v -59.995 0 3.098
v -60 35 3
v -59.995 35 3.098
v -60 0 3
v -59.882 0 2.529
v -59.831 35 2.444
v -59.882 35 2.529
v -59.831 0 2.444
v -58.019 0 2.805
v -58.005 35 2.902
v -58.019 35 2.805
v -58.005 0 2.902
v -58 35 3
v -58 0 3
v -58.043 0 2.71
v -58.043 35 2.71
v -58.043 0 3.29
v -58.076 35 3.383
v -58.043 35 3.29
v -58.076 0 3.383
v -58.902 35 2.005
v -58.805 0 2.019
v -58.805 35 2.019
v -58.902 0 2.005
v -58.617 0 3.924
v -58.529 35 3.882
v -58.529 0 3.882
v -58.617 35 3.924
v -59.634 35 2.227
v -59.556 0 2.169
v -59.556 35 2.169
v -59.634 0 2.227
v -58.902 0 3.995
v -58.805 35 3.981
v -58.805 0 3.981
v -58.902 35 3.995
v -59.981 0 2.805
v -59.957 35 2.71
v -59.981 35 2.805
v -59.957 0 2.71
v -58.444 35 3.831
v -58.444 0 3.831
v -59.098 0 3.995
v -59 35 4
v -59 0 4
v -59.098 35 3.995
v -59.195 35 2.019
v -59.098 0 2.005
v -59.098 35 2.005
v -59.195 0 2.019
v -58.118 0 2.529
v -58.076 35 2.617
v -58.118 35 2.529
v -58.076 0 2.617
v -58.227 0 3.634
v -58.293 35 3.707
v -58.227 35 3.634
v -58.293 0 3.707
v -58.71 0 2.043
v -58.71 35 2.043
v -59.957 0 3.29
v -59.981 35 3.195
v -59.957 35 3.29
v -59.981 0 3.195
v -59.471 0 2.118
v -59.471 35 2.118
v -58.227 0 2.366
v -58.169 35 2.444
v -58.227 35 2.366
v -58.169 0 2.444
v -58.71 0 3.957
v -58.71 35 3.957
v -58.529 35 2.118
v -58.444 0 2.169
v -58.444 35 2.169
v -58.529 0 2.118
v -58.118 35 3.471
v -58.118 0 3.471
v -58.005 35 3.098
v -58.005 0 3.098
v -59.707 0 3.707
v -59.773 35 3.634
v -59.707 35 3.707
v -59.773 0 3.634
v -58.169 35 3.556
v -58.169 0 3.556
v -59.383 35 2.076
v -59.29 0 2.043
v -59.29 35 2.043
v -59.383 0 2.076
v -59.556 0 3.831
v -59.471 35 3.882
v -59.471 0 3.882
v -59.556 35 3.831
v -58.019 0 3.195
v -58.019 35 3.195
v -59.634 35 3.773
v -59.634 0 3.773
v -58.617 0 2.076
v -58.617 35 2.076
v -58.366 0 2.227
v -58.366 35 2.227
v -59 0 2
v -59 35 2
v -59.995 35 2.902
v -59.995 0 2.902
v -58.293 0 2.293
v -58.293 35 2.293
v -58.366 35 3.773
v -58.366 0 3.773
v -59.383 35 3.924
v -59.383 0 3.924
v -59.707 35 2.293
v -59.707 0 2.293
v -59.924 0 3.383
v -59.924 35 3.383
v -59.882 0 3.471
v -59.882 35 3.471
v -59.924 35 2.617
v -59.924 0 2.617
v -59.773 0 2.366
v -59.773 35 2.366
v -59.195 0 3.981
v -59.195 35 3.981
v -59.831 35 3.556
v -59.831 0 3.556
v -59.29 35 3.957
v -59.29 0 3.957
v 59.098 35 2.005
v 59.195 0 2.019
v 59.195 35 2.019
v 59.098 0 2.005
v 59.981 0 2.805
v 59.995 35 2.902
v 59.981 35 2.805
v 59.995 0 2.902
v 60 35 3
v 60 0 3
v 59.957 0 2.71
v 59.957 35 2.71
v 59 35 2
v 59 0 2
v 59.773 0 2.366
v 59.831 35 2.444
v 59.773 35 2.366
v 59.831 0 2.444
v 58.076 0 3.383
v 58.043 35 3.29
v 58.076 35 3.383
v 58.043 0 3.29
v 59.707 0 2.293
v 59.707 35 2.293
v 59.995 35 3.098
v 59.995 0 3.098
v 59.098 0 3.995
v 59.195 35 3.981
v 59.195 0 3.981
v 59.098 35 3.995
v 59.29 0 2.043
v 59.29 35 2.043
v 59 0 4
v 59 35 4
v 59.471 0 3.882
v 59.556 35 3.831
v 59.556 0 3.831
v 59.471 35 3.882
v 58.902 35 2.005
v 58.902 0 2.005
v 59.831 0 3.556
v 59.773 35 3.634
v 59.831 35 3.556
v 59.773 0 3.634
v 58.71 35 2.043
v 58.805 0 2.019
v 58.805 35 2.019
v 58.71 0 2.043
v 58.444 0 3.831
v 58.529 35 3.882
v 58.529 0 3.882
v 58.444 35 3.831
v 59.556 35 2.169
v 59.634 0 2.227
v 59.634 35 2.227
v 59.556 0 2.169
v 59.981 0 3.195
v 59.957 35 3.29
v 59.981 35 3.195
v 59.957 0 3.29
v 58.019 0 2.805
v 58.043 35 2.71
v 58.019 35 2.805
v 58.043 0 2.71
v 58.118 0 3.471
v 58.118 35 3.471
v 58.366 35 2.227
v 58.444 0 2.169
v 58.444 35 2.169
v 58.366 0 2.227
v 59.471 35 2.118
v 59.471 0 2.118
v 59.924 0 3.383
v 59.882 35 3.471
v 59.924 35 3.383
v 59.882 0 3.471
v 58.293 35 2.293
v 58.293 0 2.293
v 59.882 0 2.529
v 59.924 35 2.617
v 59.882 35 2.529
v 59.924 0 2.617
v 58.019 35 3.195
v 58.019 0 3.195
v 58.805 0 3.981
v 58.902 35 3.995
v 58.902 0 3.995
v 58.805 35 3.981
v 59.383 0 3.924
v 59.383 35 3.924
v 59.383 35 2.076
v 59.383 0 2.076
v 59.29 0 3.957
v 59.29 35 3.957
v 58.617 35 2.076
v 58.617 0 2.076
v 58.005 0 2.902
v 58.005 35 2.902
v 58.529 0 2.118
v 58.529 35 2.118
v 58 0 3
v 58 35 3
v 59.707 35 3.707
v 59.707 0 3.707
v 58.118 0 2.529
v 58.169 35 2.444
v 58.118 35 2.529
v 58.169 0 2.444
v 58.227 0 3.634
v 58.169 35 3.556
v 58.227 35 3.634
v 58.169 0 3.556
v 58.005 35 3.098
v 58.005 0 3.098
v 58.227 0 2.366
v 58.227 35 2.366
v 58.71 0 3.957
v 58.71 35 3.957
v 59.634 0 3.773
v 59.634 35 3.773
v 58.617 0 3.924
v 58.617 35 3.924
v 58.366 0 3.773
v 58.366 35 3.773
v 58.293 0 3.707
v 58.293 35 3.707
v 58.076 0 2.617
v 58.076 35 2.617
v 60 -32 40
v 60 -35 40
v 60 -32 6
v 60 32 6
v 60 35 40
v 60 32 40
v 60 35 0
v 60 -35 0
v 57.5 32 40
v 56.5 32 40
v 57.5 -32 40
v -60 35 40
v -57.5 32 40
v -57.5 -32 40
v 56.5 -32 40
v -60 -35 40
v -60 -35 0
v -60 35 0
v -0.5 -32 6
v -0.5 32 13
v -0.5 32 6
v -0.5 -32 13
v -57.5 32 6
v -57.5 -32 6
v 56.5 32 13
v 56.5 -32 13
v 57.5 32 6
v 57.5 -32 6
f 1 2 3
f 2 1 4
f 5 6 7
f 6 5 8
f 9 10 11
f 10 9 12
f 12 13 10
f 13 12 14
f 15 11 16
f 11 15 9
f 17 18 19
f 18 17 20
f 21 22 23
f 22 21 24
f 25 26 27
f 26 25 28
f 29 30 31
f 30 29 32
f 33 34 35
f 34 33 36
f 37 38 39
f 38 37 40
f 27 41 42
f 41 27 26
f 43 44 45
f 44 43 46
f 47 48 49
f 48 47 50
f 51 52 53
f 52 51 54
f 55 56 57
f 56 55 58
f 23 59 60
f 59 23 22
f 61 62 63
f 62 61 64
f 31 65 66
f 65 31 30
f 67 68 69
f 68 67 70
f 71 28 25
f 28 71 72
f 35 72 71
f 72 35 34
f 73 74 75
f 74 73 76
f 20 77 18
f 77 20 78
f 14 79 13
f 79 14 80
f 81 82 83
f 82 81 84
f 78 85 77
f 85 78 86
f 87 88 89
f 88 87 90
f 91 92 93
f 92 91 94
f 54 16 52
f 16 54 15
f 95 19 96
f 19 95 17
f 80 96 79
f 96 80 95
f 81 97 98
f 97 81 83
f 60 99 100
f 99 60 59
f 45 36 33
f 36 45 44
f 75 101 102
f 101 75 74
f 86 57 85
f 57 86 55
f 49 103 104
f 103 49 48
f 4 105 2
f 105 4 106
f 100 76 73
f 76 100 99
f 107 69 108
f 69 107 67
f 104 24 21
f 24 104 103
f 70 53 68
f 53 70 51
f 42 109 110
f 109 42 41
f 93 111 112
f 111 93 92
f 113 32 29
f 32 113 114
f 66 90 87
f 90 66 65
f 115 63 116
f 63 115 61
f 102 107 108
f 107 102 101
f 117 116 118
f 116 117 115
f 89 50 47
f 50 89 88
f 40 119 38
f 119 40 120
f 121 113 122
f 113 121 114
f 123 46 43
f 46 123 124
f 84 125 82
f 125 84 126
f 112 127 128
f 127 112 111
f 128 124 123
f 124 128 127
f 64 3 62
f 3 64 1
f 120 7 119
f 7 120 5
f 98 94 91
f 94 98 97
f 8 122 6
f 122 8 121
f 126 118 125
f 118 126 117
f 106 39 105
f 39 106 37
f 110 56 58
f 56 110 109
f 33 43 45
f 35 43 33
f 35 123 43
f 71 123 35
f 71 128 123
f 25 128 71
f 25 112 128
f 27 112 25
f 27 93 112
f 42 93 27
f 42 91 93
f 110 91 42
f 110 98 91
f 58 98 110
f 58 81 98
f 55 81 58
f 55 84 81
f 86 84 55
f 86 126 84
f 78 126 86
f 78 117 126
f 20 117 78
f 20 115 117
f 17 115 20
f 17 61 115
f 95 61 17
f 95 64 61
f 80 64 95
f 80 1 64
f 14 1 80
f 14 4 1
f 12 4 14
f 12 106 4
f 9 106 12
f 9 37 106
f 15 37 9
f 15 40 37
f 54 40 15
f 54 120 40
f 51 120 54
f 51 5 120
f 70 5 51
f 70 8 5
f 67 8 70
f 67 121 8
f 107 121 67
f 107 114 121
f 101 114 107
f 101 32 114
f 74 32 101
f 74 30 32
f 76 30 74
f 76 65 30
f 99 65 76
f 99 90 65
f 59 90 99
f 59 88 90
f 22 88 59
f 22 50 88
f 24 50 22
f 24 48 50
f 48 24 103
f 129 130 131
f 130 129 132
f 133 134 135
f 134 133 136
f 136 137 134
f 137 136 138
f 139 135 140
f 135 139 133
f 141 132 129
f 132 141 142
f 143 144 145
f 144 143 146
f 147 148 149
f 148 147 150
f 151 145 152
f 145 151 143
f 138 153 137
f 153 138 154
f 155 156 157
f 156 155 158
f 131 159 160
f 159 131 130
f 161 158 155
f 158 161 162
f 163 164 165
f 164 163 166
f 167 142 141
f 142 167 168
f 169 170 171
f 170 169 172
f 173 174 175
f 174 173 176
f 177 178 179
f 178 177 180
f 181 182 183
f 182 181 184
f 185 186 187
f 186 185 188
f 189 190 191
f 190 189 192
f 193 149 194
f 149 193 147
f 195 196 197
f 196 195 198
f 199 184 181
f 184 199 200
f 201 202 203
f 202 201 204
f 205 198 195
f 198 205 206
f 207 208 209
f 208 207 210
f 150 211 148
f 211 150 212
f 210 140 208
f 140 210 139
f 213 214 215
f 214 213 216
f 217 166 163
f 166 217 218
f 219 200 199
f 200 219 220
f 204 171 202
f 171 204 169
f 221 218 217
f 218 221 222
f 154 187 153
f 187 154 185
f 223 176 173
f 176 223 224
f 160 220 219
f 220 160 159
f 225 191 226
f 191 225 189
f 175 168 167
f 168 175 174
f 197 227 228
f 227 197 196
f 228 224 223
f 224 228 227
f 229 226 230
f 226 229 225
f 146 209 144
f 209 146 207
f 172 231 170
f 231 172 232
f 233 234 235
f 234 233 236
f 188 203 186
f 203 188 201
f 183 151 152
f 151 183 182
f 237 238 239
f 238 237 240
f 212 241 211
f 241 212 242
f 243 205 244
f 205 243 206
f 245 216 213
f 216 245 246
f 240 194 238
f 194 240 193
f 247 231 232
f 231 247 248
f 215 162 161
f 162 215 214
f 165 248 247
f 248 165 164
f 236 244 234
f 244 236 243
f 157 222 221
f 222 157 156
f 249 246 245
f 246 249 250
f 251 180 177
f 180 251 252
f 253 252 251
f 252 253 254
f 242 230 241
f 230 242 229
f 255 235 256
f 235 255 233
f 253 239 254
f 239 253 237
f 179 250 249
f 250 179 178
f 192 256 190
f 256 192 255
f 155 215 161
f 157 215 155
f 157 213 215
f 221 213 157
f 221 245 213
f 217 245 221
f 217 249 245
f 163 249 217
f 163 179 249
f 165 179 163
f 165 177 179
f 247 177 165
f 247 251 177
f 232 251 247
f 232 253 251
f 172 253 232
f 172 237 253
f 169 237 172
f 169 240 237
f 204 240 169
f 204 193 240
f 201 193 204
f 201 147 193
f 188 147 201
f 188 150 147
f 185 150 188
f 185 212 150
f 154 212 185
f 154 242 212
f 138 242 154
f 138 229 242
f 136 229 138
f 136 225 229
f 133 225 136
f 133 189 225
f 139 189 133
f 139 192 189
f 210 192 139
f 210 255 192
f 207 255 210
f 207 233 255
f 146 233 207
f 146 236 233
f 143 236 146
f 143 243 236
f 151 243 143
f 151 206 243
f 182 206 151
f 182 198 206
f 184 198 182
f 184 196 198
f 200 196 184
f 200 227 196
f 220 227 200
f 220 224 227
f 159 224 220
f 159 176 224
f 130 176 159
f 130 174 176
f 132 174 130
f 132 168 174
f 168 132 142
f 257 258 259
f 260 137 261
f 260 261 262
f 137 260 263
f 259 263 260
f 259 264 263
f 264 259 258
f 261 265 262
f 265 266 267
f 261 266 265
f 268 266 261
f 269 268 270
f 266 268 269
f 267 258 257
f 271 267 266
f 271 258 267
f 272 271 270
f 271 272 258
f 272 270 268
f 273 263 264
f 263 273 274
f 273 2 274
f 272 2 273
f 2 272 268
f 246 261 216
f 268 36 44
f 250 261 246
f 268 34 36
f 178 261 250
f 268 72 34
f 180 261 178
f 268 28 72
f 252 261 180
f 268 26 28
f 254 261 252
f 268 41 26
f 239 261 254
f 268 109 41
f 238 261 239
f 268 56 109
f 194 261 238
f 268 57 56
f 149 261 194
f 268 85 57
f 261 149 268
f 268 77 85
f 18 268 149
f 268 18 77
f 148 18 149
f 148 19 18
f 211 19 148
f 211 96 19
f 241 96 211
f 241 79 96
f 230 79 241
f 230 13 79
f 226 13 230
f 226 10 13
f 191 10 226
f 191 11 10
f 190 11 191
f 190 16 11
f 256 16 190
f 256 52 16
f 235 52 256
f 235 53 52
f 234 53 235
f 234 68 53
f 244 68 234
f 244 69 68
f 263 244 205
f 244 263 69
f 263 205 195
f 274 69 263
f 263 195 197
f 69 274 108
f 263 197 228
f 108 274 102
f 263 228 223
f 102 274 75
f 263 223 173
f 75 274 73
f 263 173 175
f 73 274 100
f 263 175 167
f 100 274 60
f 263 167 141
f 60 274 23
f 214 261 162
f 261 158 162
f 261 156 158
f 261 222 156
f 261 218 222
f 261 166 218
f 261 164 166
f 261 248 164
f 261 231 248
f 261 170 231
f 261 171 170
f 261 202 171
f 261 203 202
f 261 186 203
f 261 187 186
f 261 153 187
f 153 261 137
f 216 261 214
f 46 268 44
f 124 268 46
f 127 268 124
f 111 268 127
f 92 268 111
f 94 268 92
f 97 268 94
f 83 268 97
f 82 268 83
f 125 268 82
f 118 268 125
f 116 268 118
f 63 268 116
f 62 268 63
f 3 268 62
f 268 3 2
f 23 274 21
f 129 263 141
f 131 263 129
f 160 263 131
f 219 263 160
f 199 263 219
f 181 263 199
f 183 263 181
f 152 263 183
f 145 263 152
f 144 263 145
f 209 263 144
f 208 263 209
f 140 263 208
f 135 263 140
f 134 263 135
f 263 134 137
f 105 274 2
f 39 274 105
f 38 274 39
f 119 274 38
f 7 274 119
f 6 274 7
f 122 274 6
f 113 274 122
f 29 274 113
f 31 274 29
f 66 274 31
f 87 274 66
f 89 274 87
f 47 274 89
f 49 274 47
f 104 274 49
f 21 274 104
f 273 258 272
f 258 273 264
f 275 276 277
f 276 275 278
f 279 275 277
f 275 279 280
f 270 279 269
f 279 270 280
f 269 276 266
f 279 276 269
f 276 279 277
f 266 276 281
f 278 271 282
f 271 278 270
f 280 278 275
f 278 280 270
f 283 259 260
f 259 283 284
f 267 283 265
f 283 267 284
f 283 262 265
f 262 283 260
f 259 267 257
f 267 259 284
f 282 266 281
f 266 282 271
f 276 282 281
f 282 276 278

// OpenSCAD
// Buffer tank for mini horizontal gel-electrophoresis box
// Units: mm. Tank rests on XY plane at z = 0, builds upward (+Z).

$fn = 64;

// ---- Tank ----
tank_x      = 120;   // outer length (X)
tank_y      = 70;    // outer width (Y)
tank_h      = 40;    // outer height (Z)
wall        = 3;     // wall thickness
floor_t     = 3;     // floor thickness

// ---- Gel-tray platform ----
plat_x      = 60;    // platform length in X (centred)
plat_top_z  = 13;    // platform top height above inner floor (z = 13)

// ---- Electrode holes ----
hole_d      = 2;     // electrode hole diameter
hole_y      = 0;     // electrode hole Y position
hole_w_z    = tank_h - floor_t; // hole length along Z (through end wall)

// ---- Misc ----
eps         = 0.5;   // cutter overshoot past faces

// ---- Derived ----
inner_x = tank_x - 2 * wall;     // 114
inner_y = tank_y - 2 * wall;     // 64
inner_fz = floor_t;              // floor top (z = 3)
plat_bz  = inner_fz + wall;      // platform bottom (z = 6)

difference() {
    // Main tank body
    translate([-tank_x/2, -tank_y/2, 0])
        cube([tank_x, tank_y, tank_h]);

    // Two side buffer chambers (remove everything above the platform)
    translate([-inner_x/2 - eps, -inner_y/2, plat_bz])
        cube([inner_x/2, inner_y, tank_h - plat_bz]);
    translate([ inner_x/2 + eps, -inner_y/2, plat_bz])
        cube([inner_x/2, inner_y, tank_h - plat_bz]);

    // Horizontal cut through the platform so the chambers connect above it
    translate([-inner_x/2 - eps, -inner_y/2, plat_top_z])
        cube([inner_x, inner_y, tank_h - plat_top_z]);

    // Electrode holes through each end wall (along X)
    for (side = [-1, 1])
        translate([side * (tank_x/2 - hole_d/2), hole_y, inner_fz])
            rotate([-90, 0, 0])
                cylinder(d = hole_d, h = hole_w_z);
}
